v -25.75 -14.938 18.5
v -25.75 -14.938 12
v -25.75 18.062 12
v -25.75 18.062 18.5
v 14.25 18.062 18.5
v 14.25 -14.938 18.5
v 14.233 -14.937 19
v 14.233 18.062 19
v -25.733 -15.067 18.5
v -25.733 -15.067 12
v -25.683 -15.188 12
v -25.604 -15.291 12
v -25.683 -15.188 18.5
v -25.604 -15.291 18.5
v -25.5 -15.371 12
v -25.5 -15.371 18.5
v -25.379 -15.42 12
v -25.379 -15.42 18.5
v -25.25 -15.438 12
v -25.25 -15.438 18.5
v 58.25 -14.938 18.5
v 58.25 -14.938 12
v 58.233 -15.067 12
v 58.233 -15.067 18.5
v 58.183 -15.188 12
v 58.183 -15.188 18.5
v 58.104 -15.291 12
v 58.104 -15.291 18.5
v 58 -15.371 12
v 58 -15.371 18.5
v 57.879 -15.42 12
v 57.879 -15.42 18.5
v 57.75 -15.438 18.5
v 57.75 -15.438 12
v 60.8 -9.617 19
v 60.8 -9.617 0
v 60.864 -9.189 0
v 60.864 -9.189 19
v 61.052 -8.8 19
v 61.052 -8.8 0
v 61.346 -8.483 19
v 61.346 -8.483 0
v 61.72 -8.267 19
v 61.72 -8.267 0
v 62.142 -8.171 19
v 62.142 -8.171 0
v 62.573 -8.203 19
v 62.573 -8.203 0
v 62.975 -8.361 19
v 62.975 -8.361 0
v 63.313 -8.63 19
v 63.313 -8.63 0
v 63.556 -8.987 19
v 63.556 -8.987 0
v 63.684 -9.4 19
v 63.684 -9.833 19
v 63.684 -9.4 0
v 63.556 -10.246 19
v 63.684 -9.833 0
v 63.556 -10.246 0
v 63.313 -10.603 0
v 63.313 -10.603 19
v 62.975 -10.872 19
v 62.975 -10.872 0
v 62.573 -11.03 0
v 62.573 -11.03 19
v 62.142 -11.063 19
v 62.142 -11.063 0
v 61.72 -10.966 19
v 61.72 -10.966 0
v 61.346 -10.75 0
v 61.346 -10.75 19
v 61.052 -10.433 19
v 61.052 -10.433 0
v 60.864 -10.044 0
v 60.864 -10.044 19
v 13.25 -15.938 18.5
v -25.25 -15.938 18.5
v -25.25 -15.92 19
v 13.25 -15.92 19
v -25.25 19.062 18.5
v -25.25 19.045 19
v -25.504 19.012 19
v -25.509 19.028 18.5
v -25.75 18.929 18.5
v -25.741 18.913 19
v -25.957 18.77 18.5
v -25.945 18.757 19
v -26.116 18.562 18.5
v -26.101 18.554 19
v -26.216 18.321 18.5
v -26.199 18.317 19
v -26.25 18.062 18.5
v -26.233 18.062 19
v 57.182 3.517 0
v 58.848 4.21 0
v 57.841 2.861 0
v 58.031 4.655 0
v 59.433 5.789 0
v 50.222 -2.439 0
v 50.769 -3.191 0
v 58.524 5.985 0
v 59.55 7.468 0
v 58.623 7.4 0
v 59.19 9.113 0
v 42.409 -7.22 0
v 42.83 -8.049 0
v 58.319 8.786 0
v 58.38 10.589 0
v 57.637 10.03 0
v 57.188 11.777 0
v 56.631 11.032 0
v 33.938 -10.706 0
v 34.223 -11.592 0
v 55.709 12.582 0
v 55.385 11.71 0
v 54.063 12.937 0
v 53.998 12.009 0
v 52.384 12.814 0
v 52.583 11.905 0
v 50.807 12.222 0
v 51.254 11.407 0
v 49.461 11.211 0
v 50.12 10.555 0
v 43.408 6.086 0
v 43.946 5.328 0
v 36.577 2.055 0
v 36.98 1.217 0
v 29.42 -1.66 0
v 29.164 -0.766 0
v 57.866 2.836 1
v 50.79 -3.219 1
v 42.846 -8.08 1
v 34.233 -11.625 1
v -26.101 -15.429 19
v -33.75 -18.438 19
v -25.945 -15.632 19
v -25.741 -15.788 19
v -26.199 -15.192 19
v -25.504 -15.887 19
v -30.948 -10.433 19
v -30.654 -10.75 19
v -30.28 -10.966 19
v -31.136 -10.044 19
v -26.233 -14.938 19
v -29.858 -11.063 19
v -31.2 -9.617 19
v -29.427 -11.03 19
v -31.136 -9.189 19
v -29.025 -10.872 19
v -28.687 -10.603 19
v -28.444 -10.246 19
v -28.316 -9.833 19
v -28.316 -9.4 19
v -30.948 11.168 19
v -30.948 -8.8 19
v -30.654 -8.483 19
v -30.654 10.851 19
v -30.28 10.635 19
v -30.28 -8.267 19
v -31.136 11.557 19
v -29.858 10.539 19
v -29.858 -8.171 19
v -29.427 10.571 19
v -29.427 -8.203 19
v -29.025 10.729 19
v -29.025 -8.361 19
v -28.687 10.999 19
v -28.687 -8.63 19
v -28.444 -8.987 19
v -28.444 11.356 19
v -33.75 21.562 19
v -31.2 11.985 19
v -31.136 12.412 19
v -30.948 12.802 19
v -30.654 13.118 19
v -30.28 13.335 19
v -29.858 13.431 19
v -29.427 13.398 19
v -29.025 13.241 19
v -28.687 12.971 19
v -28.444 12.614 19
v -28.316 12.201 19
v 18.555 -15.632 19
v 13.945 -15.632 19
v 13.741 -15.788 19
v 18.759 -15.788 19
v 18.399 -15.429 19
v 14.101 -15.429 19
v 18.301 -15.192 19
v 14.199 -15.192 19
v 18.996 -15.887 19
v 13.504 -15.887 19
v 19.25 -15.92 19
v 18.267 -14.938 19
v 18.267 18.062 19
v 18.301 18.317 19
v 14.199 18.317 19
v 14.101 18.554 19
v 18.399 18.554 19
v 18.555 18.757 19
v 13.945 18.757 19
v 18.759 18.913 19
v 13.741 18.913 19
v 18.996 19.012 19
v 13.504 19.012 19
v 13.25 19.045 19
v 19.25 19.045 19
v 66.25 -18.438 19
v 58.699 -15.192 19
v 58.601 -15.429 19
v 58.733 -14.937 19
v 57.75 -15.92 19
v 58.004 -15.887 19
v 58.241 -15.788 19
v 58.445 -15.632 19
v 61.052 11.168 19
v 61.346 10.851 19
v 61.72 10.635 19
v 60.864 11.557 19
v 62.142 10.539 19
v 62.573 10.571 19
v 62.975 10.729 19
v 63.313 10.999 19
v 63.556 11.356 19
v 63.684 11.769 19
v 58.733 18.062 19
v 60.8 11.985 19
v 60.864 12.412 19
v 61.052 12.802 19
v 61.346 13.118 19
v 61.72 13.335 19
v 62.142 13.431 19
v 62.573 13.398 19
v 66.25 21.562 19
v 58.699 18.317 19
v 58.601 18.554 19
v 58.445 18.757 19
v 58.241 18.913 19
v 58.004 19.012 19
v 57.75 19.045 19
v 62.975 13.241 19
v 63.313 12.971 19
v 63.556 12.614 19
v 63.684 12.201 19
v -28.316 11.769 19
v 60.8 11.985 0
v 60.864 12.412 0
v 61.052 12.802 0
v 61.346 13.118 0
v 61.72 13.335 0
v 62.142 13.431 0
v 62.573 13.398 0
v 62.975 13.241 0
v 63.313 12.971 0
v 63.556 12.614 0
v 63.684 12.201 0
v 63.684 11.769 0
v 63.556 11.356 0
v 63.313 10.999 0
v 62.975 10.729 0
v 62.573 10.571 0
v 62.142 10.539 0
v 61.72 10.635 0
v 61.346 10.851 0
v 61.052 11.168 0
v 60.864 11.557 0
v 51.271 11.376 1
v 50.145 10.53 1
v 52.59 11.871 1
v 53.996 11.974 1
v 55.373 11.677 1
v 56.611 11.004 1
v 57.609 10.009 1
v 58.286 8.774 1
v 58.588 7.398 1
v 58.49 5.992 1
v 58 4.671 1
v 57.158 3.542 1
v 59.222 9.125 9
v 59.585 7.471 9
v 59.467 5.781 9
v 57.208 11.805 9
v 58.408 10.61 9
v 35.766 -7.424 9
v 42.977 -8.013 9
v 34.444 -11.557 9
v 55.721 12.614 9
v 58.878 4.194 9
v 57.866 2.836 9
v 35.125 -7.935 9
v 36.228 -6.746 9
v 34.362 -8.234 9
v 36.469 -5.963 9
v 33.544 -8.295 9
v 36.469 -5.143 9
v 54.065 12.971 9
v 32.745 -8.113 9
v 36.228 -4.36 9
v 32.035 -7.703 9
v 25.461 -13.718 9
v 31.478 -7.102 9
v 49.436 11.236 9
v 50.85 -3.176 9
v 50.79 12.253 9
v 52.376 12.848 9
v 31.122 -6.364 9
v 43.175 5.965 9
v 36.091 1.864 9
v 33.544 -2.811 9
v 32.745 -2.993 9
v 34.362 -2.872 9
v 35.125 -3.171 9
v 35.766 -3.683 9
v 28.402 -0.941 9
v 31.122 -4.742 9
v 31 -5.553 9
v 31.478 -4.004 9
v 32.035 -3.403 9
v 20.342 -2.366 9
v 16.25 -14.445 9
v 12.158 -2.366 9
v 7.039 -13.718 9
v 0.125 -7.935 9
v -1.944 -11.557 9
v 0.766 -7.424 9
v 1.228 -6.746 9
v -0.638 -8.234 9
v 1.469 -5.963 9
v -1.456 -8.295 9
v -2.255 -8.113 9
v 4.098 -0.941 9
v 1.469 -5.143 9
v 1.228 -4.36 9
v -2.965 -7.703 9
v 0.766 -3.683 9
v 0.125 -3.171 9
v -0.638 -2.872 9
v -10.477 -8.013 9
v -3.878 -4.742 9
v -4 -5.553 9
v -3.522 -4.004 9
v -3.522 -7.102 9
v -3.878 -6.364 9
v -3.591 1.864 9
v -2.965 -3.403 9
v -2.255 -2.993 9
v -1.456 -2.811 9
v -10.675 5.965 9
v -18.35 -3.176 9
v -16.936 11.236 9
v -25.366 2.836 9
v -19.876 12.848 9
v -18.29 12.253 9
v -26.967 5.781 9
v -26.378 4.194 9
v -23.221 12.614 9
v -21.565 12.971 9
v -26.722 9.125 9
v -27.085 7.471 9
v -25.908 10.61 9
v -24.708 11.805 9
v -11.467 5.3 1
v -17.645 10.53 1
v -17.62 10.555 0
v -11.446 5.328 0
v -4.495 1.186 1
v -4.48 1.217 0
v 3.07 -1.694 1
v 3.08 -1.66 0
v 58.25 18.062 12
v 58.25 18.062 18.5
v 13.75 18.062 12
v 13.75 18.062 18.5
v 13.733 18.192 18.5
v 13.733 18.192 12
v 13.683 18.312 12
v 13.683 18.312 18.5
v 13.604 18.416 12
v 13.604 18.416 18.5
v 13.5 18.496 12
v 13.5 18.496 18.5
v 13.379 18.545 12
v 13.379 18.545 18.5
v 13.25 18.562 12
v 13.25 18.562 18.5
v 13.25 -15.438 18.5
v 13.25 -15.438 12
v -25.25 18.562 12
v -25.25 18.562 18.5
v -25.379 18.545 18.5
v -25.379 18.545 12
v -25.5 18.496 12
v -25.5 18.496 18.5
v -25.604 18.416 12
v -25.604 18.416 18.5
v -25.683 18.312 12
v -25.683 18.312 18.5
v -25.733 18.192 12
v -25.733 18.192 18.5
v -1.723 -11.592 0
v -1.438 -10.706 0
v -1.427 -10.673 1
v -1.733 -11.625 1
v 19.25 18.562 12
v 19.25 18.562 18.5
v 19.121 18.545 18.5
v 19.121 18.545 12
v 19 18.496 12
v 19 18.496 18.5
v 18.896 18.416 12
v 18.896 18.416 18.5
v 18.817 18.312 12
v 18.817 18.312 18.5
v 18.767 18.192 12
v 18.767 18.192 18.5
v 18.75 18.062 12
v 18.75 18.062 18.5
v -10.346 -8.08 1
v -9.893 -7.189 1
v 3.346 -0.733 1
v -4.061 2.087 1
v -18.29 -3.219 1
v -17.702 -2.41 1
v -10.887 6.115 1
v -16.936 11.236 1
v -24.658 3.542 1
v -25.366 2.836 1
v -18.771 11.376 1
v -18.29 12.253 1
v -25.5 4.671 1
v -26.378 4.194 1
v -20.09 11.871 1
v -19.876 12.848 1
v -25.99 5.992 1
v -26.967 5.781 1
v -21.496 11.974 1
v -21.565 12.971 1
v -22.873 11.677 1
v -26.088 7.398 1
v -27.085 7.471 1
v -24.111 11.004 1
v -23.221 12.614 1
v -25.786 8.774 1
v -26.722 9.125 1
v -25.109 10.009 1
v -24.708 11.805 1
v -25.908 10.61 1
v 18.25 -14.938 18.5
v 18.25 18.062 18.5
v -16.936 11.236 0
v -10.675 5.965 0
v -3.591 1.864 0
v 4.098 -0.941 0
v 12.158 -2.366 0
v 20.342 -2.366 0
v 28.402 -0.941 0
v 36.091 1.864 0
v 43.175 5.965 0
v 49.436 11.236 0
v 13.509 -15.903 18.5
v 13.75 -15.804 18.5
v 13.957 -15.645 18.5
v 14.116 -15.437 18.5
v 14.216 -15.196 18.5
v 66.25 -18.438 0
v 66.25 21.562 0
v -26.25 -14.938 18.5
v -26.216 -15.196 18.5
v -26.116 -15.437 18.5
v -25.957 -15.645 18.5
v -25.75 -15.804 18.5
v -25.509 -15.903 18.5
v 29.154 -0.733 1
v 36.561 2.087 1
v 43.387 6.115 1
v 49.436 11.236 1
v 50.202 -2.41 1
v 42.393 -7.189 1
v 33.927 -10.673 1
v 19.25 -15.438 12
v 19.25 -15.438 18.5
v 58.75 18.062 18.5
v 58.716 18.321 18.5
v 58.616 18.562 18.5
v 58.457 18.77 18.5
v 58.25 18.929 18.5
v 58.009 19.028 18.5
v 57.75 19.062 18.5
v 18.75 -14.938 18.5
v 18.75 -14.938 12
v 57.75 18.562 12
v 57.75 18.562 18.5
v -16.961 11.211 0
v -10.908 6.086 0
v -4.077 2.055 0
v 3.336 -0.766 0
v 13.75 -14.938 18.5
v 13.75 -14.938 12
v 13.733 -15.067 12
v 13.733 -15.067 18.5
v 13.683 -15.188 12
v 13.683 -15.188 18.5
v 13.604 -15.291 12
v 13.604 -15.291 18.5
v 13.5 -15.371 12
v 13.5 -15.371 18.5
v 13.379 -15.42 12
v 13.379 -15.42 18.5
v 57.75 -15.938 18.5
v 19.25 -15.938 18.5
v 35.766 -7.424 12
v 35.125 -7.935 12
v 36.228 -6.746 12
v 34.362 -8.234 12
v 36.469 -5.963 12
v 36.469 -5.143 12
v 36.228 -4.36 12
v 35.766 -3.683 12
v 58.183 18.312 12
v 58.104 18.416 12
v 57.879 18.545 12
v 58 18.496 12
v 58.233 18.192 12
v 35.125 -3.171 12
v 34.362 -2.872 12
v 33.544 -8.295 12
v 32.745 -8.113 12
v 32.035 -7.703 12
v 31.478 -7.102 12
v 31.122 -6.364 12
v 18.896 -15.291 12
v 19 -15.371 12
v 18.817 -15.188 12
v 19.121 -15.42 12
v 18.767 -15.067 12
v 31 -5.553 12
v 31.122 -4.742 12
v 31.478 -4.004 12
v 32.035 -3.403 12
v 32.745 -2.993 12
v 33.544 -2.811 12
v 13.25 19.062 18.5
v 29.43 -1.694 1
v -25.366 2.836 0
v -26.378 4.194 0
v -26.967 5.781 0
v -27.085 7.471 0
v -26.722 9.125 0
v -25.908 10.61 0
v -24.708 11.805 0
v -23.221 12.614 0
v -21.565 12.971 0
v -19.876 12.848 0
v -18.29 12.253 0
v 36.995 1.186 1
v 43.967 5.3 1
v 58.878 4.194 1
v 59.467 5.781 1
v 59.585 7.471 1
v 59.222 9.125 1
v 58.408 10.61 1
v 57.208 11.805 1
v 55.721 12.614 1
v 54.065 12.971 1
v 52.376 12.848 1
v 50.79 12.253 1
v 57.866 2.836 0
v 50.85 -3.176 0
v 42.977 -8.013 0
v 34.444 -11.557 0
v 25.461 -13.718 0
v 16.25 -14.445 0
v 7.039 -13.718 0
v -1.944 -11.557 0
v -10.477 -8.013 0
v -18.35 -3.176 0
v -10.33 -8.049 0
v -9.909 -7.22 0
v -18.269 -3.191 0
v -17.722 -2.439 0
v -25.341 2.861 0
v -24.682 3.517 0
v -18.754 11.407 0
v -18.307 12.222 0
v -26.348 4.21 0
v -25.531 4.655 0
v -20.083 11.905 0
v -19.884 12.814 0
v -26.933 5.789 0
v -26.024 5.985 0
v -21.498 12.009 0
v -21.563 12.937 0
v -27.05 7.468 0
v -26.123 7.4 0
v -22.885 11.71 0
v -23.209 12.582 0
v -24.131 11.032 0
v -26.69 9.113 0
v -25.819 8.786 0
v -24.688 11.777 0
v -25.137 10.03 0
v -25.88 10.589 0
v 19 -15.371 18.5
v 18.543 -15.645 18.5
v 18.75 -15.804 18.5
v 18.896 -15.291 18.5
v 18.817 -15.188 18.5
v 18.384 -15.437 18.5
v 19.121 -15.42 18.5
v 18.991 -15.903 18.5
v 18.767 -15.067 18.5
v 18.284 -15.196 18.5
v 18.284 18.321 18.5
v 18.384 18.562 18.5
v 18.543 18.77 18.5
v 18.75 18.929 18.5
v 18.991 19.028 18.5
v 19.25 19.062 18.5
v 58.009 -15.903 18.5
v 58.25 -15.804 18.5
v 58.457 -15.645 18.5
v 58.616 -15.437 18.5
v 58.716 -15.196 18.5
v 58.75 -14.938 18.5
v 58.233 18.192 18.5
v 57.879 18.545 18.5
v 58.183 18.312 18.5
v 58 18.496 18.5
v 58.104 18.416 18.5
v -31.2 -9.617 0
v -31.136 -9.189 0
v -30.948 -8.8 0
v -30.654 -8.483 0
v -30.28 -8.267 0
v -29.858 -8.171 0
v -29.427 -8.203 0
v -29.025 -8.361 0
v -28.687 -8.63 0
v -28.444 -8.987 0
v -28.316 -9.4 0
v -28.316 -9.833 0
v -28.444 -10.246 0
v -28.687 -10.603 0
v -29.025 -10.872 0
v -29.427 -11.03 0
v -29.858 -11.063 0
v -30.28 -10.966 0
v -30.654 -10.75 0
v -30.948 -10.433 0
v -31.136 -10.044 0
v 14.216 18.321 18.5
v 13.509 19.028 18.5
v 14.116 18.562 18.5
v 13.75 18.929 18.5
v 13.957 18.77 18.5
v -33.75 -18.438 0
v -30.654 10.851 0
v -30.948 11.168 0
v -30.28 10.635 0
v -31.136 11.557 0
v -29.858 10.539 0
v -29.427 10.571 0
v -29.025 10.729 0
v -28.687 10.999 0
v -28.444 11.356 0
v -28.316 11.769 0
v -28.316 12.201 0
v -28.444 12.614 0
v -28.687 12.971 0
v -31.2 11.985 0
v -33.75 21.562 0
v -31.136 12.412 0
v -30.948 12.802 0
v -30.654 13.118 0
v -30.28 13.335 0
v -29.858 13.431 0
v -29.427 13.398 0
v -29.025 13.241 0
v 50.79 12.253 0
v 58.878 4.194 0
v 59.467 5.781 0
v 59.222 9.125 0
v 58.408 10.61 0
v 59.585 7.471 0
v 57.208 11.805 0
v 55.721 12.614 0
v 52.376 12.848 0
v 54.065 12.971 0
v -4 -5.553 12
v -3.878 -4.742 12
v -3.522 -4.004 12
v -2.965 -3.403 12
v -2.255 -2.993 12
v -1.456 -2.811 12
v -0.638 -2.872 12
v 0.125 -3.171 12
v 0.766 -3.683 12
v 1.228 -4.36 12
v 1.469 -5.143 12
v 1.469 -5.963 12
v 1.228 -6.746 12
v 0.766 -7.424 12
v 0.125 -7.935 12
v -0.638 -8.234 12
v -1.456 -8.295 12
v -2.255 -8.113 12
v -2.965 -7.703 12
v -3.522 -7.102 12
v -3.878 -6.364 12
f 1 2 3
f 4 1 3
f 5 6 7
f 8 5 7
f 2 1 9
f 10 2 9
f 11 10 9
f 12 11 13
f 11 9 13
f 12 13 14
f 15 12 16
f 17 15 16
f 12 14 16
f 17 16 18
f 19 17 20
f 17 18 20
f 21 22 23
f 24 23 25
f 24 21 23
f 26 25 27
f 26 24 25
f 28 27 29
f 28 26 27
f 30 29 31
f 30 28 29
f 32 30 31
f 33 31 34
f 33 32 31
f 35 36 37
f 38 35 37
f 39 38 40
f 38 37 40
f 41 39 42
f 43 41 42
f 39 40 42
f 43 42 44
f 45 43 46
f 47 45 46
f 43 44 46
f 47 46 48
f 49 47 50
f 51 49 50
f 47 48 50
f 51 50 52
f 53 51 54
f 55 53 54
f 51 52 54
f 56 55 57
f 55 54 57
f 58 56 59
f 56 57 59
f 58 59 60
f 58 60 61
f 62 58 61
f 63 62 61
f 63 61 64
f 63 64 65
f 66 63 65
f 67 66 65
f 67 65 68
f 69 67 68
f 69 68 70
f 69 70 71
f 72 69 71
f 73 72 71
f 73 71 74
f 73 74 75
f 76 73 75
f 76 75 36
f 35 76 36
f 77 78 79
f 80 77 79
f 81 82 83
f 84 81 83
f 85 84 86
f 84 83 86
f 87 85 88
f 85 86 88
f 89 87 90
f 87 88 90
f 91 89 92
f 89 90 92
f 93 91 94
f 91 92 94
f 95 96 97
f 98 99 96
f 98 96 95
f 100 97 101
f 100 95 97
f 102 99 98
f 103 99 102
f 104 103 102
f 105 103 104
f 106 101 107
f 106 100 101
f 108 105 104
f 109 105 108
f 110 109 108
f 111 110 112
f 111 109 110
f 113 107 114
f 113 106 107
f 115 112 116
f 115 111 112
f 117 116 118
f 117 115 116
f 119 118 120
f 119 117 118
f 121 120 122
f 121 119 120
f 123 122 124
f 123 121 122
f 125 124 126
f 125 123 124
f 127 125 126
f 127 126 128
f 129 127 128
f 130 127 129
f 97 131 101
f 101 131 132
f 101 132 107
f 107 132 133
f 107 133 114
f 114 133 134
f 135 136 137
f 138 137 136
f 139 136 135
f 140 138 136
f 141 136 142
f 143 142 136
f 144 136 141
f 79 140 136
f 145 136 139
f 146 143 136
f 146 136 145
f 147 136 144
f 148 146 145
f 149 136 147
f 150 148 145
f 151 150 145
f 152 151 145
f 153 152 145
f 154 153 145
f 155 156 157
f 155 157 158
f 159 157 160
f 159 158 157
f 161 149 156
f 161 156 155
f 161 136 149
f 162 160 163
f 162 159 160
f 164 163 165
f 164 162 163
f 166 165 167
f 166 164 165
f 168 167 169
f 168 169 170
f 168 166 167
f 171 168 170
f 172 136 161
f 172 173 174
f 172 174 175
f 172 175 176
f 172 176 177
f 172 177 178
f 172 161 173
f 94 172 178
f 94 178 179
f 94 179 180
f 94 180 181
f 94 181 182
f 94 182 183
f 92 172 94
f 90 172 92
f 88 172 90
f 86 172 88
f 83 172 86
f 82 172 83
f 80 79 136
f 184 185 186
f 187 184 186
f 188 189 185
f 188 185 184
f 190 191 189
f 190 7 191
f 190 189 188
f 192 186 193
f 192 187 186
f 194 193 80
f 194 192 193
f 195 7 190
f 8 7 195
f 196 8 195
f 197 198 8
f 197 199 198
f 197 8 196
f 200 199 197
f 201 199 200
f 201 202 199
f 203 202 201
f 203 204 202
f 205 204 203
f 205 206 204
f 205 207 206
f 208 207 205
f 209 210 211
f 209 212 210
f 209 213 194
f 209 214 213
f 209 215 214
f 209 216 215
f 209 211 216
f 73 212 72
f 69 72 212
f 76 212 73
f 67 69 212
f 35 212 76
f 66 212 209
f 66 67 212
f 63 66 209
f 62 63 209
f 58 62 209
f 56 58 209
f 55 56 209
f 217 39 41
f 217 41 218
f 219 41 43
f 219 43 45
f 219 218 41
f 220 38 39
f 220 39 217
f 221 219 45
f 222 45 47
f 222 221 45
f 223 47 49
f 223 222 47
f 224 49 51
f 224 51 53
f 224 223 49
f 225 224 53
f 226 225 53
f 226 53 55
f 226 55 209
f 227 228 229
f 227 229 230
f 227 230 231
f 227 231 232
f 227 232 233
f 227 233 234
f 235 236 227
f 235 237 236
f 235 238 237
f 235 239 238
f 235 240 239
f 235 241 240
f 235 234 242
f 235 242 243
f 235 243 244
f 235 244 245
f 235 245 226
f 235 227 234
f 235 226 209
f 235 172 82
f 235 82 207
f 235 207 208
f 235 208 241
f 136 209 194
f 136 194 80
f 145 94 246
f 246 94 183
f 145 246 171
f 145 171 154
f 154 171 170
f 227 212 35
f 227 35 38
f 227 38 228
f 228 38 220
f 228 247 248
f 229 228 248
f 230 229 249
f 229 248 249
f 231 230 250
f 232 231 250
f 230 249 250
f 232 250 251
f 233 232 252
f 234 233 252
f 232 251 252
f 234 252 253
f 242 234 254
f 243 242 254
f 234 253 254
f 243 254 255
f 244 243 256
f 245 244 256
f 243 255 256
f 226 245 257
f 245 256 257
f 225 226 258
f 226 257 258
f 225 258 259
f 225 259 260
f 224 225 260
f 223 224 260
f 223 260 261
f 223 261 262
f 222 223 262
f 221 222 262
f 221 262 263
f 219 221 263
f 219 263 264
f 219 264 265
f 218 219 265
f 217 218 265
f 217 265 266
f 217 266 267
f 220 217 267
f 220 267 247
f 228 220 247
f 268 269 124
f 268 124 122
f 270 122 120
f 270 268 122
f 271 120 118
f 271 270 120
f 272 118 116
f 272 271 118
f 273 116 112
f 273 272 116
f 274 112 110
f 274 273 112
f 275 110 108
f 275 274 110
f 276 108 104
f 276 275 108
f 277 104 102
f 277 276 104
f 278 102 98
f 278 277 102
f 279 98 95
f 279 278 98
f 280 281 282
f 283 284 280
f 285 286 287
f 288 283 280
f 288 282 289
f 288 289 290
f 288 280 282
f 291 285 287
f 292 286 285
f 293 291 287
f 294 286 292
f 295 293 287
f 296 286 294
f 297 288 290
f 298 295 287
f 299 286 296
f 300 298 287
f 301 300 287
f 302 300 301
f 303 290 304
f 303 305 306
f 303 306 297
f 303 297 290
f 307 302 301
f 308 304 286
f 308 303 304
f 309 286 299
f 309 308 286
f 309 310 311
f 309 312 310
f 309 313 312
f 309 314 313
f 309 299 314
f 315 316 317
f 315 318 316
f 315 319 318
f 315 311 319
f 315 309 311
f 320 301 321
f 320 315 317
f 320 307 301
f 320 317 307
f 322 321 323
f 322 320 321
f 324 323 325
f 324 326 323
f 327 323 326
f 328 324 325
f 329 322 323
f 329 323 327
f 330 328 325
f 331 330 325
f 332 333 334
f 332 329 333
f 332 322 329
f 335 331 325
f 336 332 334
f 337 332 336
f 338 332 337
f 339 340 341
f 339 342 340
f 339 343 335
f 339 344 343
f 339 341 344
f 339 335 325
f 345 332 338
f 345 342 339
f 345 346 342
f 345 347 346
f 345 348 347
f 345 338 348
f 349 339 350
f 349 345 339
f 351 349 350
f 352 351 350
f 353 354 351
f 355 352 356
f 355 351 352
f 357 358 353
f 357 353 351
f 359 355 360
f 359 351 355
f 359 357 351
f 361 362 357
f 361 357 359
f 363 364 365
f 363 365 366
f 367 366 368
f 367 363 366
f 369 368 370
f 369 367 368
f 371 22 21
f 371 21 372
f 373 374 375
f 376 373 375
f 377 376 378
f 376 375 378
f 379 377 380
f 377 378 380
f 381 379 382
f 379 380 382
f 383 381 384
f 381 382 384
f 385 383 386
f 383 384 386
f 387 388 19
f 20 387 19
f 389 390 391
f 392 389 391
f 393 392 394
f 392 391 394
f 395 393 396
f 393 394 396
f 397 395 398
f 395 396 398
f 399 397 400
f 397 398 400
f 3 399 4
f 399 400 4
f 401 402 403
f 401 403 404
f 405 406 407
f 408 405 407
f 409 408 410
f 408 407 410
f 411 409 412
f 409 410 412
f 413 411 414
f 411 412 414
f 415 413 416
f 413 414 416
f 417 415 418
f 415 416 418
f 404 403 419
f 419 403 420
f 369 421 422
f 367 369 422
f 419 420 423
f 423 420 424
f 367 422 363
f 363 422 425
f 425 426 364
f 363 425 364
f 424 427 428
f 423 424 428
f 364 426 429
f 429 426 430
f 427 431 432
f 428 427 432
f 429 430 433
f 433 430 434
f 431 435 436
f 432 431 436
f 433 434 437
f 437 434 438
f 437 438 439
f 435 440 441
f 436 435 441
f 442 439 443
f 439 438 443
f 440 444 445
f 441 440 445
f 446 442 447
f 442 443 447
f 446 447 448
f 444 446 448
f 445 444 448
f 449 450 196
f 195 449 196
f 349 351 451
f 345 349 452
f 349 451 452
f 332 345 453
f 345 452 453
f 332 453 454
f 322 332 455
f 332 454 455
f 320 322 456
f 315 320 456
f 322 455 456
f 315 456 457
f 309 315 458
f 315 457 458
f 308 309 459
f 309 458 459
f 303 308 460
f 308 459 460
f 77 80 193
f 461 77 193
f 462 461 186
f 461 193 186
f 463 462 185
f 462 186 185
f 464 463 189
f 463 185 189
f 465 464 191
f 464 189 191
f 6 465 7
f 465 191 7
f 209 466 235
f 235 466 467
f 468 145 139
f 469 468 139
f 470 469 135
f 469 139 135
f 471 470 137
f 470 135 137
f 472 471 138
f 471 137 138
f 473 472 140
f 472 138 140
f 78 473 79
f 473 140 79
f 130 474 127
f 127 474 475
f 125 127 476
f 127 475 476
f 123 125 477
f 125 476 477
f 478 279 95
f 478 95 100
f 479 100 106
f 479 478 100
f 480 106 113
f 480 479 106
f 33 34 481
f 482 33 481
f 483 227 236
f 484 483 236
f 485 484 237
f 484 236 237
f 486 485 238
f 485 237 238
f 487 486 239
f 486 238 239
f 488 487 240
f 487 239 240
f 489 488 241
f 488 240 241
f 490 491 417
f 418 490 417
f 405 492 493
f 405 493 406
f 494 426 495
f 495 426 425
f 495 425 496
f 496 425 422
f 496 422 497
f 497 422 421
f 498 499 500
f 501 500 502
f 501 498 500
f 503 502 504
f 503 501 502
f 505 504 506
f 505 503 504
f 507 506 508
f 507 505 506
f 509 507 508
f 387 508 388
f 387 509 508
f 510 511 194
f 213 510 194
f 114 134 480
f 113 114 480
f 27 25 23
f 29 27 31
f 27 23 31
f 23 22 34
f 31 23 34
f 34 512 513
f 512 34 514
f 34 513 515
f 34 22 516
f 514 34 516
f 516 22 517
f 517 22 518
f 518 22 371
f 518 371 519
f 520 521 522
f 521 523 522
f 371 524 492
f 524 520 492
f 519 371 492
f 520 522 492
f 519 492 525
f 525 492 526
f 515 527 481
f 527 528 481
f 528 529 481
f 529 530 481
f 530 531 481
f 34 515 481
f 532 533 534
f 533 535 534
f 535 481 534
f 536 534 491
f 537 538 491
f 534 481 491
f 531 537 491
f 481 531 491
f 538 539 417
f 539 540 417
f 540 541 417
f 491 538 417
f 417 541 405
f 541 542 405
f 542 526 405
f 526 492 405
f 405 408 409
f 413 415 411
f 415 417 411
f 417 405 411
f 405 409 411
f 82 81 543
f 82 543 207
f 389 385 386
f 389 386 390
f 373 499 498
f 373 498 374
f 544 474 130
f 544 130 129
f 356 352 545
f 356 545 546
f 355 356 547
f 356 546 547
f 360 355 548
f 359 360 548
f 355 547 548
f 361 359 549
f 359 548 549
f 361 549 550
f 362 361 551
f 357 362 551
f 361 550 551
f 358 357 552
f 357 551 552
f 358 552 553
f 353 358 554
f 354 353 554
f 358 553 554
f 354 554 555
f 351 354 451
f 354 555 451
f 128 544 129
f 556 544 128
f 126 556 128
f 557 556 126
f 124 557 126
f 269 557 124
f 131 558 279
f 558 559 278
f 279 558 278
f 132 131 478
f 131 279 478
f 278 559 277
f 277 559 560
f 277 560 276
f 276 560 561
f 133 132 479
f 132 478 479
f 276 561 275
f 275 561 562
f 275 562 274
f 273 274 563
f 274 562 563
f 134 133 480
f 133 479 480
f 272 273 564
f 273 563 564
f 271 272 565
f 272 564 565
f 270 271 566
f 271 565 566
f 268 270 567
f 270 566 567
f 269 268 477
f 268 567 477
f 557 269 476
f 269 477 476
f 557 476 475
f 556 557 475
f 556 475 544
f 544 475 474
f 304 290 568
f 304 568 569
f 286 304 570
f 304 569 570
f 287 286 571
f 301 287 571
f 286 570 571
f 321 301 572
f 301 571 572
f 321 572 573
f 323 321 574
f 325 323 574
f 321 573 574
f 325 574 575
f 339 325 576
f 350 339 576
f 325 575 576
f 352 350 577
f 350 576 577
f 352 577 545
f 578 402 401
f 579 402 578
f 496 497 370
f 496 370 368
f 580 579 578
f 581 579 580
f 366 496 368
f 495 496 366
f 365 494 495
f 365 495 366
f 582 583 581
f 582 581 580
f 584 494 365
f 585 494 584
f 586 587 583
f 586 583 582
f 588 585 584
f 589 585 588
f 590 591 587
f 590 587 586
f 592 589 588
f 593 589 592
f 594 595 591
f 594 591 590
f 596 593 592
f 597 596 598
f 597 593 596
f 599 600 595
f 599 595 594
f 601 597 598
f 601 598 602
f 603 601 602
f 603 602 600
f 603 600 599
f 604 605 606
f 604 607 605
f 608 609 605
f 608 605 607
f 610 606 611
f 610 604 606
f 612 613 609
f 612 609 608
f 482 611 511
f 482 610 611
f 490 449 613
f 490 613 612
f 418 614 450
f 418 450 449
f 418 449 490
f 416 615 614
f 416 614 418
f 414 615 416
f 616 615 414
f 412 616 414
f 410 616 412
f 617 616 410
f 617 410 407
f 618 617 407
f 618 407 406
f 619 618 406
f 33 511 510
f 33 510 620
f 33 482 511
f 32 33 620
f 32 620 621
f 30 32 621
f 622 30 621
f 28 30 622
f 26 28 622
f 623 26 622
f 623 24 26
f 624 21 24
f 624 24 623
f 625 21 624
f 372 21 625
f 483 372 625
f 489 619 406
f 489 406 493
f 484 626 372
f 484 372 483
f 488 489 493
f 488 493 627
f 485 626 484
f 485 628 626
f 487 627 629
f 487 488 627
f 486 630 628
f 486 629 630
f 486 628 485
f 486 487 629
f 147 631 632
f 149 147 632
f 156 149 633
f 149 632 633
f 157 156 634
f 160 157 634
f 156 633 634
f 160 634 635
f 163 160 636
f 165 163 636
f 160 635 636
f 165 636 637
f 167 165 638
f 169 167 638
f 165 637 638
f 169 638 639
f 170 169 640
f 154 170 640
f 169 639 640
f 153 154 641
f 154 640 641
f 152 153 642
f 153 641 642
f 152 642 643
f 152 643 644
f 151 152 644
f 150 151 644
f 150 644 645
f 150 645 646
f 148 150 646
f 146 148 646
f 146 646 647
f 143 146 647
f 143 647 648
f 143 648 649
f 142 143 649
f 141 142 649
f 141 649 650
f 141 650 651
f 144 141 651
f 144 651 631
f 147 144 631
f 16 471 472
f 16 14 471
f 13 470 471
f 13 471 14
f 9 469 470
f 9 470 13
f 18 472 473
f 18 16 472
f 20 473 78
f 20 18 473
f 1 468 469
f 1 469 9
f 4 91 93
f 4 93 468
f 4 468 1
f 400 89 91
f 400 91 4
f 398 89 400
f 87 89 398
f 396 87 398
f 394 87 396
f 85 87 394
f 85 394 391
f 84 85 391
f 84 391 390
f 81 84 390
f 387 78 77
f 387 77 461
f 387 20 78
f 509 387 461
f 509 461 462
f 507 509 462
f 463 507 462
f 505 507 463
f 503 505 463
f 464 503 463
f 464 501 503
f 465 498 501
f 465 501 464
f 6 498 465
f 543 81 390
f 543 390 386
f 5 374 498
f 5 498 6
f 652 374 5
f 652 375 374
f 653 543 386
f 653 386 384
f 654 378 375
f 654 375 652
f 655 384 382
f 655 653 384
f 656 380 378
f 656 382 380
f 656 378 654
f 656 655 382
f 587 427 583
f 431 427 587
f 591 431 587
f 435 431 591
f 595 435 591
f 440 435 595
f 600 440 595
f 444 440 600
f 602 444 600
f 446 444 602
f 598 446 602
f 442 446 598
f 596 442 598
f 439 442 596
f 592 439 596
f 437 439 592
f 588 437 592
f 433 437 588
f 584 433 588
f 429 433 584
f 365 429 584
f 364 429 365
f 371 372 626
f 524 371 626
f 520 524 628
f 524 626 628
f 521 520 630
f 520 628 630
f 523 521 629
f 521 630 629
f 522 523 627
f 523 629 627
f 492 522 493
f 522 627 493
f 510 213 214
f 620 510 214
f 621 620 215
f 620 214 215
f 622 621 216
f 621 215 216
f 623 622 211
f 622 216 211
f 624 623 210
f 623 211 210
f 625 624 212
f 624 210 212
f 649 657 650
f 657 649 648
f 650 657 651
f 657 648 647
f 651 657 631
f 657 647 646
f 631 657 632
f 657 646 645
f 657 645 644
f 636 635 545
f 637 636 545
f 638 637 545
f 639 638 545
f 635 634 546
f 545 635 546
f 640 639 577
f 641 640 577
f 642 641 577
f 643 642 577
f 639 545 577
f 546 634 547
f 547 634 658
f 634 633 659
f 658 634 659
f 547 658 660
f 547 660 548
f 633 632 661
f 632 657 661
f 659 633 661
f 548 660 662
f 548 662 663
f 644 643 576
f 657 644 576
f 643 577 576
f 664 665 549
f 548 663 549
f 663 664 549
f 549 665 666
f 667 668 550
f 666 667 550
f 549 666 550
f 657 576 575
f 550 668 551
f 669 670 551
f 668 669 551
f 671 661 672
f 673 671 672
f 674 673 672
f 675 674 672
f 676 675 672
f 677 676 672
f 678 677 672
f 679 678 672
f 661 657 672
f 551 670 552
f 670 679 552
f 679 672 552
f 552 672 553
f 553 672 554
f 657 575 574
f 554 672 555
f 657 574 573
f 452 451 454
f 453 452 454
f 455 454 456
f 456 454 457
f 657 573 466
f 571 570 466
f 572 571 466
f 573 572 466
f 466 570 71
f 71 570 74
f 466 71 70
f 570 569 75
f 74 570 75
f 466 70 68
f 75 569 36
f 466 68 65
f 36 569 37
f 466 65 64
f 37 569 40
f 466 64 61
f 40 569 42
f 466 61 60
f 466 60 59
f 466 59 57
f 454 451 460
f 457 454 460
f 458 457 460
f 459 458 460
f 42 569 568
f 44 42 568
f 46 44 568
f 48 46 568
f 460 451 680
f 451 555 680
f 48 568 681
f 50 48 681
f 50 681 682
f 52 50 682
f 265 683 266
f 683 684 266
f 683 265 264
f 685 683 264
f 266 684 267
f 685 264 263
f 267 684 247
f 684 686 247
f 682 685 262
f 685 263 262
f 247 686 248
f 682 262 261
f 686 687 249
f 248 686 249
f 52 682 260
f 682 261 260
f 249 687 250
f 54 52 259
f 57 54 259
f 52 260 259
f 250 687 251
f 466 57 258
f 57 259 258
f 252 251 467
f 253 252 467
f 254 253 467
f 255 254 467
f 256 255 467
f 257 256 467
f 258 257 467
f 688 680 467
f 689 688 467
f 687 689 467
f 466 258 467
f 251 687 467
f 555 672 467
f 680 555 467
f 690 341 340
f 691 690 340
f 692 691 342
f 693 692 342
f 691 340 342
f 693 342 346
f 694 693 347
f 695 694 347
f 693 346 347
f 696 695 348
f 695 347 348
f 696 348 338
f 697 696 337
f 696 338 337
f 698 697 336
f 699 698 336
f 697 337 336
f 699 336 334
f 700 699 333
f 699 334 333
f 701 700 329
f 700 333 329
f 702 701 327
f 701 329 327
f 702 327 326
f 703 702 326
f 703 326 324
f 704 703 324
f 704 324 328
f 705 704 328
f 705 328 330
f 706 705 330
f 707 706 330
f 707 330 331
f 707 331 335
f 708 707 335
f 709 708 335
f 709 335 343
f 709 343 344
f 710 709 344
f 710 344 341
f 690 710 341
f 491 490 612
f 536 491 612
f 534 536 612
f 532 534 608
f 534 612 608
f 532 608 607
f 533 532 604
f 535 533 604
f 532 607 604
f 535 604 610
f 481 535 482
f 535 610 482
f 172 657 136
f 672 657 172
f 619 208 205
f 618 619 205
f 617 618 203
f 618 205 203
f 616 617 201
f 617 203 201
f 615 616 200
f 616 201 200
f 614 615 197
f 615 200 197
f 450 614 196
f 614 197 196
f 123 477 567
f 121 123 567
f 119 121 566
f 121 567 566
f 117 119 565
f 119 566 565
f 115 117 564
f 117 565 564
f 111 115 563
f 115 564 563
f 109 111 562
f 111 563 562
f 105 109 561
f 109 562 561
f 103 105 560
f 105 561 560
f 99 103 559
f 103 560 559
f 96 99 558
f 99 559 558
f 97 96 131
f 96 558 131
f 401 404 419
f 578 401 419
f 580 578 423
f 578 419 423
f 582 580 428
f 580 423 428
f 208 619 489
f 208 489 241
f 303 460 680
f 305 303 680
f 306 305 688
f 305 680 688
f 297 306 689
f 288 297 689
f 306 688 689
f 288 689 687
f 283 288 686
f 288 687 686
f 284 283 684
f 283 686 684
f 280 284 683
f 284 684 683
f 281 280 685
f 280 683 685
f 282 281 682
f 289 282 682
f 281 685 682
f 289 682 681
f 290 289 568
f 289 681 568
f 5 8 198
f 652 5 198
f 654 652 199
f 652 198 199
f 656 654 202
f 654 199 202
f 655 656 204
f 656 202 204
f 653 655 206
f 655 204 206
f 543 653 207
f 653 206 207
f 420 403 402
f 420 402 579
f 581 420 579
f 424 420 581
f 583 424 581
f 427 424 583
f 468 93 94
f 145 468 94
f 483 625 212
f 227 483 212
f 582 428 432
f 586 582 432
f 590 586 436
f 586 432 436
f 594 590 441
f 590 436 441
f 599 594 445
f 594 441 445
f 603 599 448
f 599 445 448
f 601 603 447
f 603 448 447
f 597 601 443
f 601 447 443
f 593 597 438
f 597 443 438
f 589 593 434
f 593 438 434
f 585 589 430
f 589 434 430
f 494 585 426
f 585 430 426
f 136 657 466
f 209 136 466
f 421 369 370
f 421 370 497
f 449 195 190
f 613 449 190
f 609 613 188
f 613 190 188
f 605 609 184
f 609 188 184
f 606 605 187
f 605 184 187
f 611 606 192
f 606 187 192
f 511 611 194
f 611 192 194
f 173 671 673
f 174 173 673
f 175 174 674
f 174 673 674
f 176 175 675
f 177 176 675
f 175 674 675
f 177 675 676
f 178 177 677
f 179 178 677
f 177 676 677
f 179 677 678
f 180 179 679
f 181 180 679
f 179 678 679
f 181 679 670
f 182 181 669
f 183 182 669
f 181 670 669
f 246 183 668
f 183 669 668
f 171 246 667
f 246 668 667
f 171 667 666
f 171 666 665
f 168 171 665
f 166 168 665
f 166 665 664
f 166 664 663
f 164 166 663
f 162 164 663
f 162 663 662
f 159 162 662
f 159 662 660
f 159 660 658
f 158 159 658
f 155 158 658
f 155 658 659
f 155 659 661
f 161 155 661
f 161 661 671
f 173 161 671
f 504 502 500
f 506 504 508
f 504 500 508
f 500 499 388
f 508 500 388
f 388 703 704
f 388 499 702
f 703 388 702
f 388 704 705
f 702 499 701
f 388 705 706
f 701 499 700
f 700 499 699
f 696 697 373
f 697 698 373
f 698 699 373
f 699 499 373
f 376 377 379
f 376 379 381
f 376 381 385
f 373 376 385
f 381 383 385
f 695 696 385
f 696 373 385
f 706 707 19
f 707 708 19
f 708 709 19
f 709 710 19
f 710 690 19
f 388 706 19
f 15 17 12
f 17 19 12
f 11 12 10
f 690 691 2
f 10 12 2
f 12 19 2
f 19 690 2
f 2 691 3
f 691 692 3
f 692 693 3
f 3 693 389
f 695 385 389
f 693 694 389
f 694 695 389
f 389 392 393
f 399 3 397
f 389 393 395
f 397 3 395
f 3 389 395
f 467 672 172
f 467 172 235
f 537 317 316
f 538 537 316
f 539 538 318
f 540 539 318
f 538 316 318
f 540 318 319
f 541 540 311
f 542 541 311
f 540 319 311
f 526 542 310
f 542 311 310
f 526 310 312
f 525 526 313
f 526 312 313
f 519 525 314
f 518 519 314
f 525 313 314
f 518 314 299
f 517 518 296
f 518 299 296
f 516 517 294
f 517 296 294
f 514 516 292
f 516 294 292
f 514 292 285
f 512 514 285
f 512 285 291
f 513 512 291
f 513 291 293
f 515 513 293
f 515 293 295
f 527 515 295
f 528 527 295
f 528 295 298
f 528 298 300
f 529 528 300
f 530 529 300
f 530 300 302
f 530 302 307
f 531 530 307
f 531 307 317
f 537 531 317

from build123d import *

# Parameters (mm, degrees)
SKETCH1_W           = 100
SKETCH1_H           = 40
BOSS_EXTRUDE1_DEPTH = 38
CUT_EXTRUDE2_START  = -12
SKETCH2_W           = 39.5
SKETCH2_H           = 34
CUT_EXTRUDE2_DEPTH  = 21
CUT_EXTRUDE4_REACH  = 81.36
SKETCH4_R           = 1.45
SKETCH6_W           = 100
SKETCH6_H           = 19
CUT_EXTRUDE5_DEPTH  = 87.215210375
FILLET1_R           = 0.5
CUT_EXTRUDE6_START  = 6.5
CUT_EXTRUDE6_DEPTH  = 0.5
CUT_EXTRUDE6_TAPER  = 2
CUT_EXTRUDE7_START  = 6.5
CUT_EXTRUDE7_DEPTH  = 0.5
CUT_EXTRUDE7_TAPER  = 2
CUT_EXTRUDE8_DEPTH  = 9
CUT_EXTRUDE9_REACH  = 72.385
SKETCH14_R          = 2.75
BOSS_EXTRUDE2_START = 8
BOSS_EXTRUDE2_DEPTH = 1
BOSS_EXTRUDE2_DRAFT = 2
CUT_EXTRUDE11_START = 9
CUT_EXTRUDE11_DEPTH = 1


with BuildPart() as part:
    # Sketch1 → Boss-Extrude1 (new body)
    with BuildSketch(Plane.XY):
        with Locations((16.25, 1.5625)):
            Rectangle(SKETCH1_W, SKETCH1_H)
    extrude(amount=BOSS_EXTRUDE1_DEPTH)

    # Sketch2 → Cut-Extrude2 (cut)
    with BuildSketch(Plane(origin=(0, 0, 0), x_dir=(-1, 0, 0), z_dir=(0, 0, -1)).offset(CUT_EXTRUDE2_START)):
        with Locations((-38.5, 1.5625)):
            Rectangle(SKETCH2_W, SKETCH2_H)
        with Locations((6, 1.5625)):
            Rectangle(SKETCH2_W, SKETCH2_H)
    extrude(amount=-CUT_EXTRUDE2_DEPTH, mode=Mode.SUBTRACT)

    # Sketch4 → Cut-Extrude4 (cut, up to next)
    with BuildSketch(Plane(origin=(0, 0, 0), x_dir=(-1, 0, 0), z_dir=(0, 0, -1)), mode=Mode.PRIVATE) as cut_extrude4_sk1:
        with Locations((-62.25, 11.98479819)):
            Circle(SKETCH4_R)
    cut_extrude4_tool1 = extrude(cut_extrude4_sk1.sketch, amount=-CUT_EXTRUDE4_REACH, mode=Mode.PRIVATE) & part.part
    # Sketch4 → Cut-Extrude4 (cut, up to next)
    with BuildSketch(Plane(origin=(0, 0, 0), x_dir=(-1, 0, 0), z_dir=(0, 0, -1)), mode=Mode.PRIVATE) as cut_extrude4_sk2:
        with Locations((-62.25, -9.616561755)):
            Circle(SKETCH4_R)
    cut_extrude4_tool2 = extrude(cut_extrude4_sk2.sketch, amount=-CUT_EXTRUDE4_REACH, mode=Mode.PRIVATE) & part.part
    # Sketch4 → Cut-Extrude4 (cut, up to next)
    with BuildSketch(Plane(origin=(0, 0, 0), x_dir=(-1, 0, 0), z_dir=(0, 0, -1)), mode=Mode.PRIVATE) as cut_extrude4_sk3:
        with Locations((29.75, 11.98479819)):
            Circle(SKETCH4_R)
    cut_extrude4_tool3 = extrude(cut_extrude4_sk3.sketch, amount=-CUT_EXTRUDE4_REACH, mode=Mode.PRIVATE) & part.part
    # Sketch4 → Cut-Extrude4 (cut, up to next)
    with BuildSketch(Plane(origin=(0, 0, 0), x_dir=(-1, 0, 0), z_dir=(0, 0, -1)), mode=Mode.PRIVATE) as cut_extrude4_sk4:
        with Locations((29.75, -9.616561755)):
            Circle(SKETCH4_R)
    cut_extrude4_tool4 = extrude(cut_extrude4_sk4.sketch, amount=-CUT_EXTRUDE4_REACH, mode=Mode.PRIVATE) & part.part
    add(cut_extrude4_tool1.solids().sort_by_distance((62.25, 11.984798, 0))[0], mode=Mode.SUBTRACT)
    add(cut_extrude4_tool2.solids().sort_by_distance((62.25, -9.616562, 0))[0], mode=Mode.SUBTRACT)
    add(cut_extrude4_tool3.solids().sort_by_distance((-29.75, 11.984798, 0))[0], mode=Mode.SUBTRACT)
    add(cut_extrude4_tool4.solids().sort_by_distance((-29.75, -9.616562, 0))[0], mode=Mode.SUBTRACT)

    # Sketch6 → Cut-Extrude5 (cut, through all)
    with BuildSketch(Plane(origin=(0, 21.5625, 0), x_dir=(1, 0, 0), z_dir=(0, 1, 0))):
        with Locations((16.25, -28.5)):
            Rectangle(SKETCH6_W, SKETCH6_H)
    extrude(amount=-CUT_EXTRUDE5_DEPTH, mode=Mode.SUBTRACT)

    # Fillet1
    fillet1_edges = [part.edges().sort_by_distance(p)[0] for p in [
        (-25.75, -15.4375, 15.5),
        (13.75, -15.4375, 15.5),
        (-25.75, 18.5625, 15.5),
        (13.75, 18.5625, 15.5),
        (18.75, -15.4375, 15.5),
        (58.25, -15.4375, 15.5),
        (18.75, 18.5625, 15.5),
        (58.25, 18.5625, 15.5),
    ]]
    fillet(fillet1_edges, radius=FILLET1_R)

    # Sketch10 → Cut-Extrude6 (cut)
    with BuildSketch(Plane.XY.offset(12).offset(CUT_EXTRUDE6_START)):
        with BuildLine():
            Line((14.25, -14.9375), (14.25, 18.0625))
            ThreePointArc((14.25, 18.0625), (13.957106781, 18.769606781), (13.25, 19.0625))
            Line((13.25, 19.0625), (-25.25, 19.0625))
            ThreePointArc((-25.25, 19.0625), (-25.957106781, 18.769606781), (-26.25, 18.0625))
            Line((-26.25, 18.0625), (-26.25, -14.9375))
            ThreePointArc((-26.25, -14.9375), (-25.957106781, -15.644606781), (-25.25, -15.9375))
            Line((-25.25, -15.9375), (13.25, -15.9375))
            ThreePointArc((13.25, -15.9375), (13.957106781, -15.644606781), (14.25, -14.9375))
        make_face()
    extrude(amount=CUT_EXTRUDE6_DEPTH, taper=CUT_EXTRUDE6_TAPER, mode=Mode.SUBTRACT)

    # Sketch11 → Cut-Extrude7 (cut)
    with BuildSketch(Plane.XY.offset(12).offset(CUT_EXTRUDE7_START)):
        with BuildLine():
            Line((58.75, -14.9375), (58.75, 18.0625))
            ThreePointArc((58.75, 18.0625), (58.457106781, 18.769606781), (57.75, 19.0625))
            Line((57.75, 19.0625), (19.25, 19.0625))
            ThreePointArc((19.25, 19.0625), (18.542893219, 18.769606781), (18.25, 18.0625))
            Line((18.25, 18.0625), (18.25, -14.9375))
            ThreePointArc((18.25, -14.9375), (18.542893219, -15.644606781), (19.25, -15.9375))
            Line((19.25, -15.9375), (57.75, -15.9375))
            ThreePointArc((57.75, -15.9375), (58.457106781, -15.644606781), (58.75, -14.9375))
        make_face()
    extrude(amount=CUT_EXTRUDE7_DEPTH, taper=CUT_EXTRUDE7_TAPER, mode=Mode.SUBTRACT)

    # Sketch12 → Cut-Extrude8 (cut)
    with BuildSketch(Plane(origin=(0, 0, 0), x_dir=(-1, 0, 0), z_dir=(0, 0, -1))):
        with BuildLine():
            ThreePointArc((-57.865926724, 2.836052), (-16.25, -14.444957865), (25.365926724, 2.836052))
            ThreePointArc((25.365926724, 2.836052), (25.351045487, 11.250609537), (16.93648795, 11.235728299))
            ThreePointArc((16.93648795, 11.235728299), (-16.25, -2.544957865), (-49.43648795, 11.235728299))
            ThreePointArc((-49.43648795, 11.235728299), (-57.851045487, 11.250609537), (-57.865926724, 2.836052))
        make_face()
    extrude(amount=-CUT_EXTRUDE8_DEPTH, mode=Mode.SUBTRACT)

    # Sketch14 → Cut-Extrude9 (cut, up to next)
    with BuildSketch(Plane(origin=(0, 0, 9), x_dir=(-1, 0, 0), z_dir=(0, 0, -1)), mode=Mode.PRIVATE) as cut_extrude9_sk1:
        with Locations((-33.75, -5.553059818)):
            Circle(SKETCH14_R)
    cut_extrude9_tool1 = extrude(cut_extrude9_sk1.sketch, amount=-CUT_EXTRUDE9_REACH, mode=Mode.PRIVATE) & part.part
    # Sketch14 → Cut-Extrude9 (cut, up to next)
    with BuildSketch(Plane(origin=(0, 0, 9), x_dir=(-1, 0, 0), z_dir=(0, 0, -1)), mode=Mode.PRIVATE) as cut_extrude9_sk2:
        with Locations((1.25, -5.553059818)):
            Circle(SKETCH14_R)
    cut_extrude9_tool2 = extrude(cut_extrude9_sk2.sketch, amount=-CUT_EXTRUDE9_REACH, mode=Mode.PRIVATE) & part.part
    add(cut_extrude9_tool1.solids().sort_by_distance((33.75, -5.55306, 9))[0], mode=Mode.SUBTRACT)
    add(cut_extrude9_tool2.solids().sort_by_distance((-1.25, -5.55306, 9))[0], mode=Mode.SUBTRACT)


with BuildPart() as body_2:
    # Sketch15 → Boss-Extrude2 (with draft: the straight prism first)
    with BuildSketch(Plane(origin=(0, 0, 9), x_dir=(-1, 0, 0), z_dir=(0, 0, -1)).offset(BOSS_EXTRUDE2_START)):
        with BuildLine():
            ThreePointArc((-49.43648795, 11.235728299), (-57.851045487, 11.250609537), (-57.865926724, 2.836052))
            ThreePointArc((-57.865926724, 2.836052), (-16.25, -14.444957865), (25.365926724, 2.836052))
            ThreePointArc((25.365926724, 2.836052), (25.351045487, 11.250609537), (16.93648795, 11.235728299))
            ThreePointArc((16.93648795, 11.235728299), (-16.25, -2.544957865), (-49.43648795, 11.235728299))
        make_face()
        with BuildLine():
            ThreePointArc((-50.144844149, 10.529873148), (-57.145190336, 10.542253337), (-57.157570525, 3.541907151))
            ThreePointArc((-57.157570525, 3.541907151), (-16.25, -13.444957865), (24.657570525, 3.541907151))
            ThreePointArc((24.657570525, 3.541907151), (24.645190336, 10.542253337), (17.644844149, 10.529873148))
            ThreePointArc((17.644844149, 10.529873148), (-16.25, -3.544957865), (-50.144844149, 10.529873148))
        make_face(mode=Mode.SUBTRACT)
    extrude(amount=BOSS_EXTRUDE2_DEPTH)
    # Boss-Extrude2: the draft: its side faces are tilted about the plane it starts from
    boss_extrude2_sides = [body_2.faces().sort_by_distance(p)[0] for p in [
        (-25.351045487, 11.250609537, 0.5),
        (16.25, -2.544957865, 0.5),
        (57.851045487, 11.250609537, 0.5),
        (16.25, -14.444957865, 0.5),
        (16.25, -13.444957865, 0.5),
        (57.145190336, 10.542253337, 0.5),
        (16.25, -3.544957865, 0.5),
        (-24.645190336, 10.542253337, 0.5),
    ]]
    draft(boss_extrude2_sides, Plane(origin=(0, 0, 9), x_dir=(-1, 0, 0), z_dir=(0, 0, -1)).offset(BOSS_EXTRUDE2_START), BOSS_EXTRUDE2_DRAFT)

    # Sketch16 → Cut-Extrude11 (cut)
    with BuildSketch(Plane(origin=(0, 0, 9), x_dir=(-1, 0, 0), z_dir=(0, 0, -1)).offset(CUT_EXTRUDE11_START)):
        with BuildLine():
            Line((-29.154329219, -0.73272854), (-29.429768477, -1.694047018))
            ThreePointArc((-29.429768477, -1.694047018), (-16.25, -3.544957865), (-3.070231523, -1.694047018))
            Line((-3.070231523, -1.694047018), (-3.345670781, -0.73272854))
            ThreePointArc((-3.345670781, -0.73272854), (-16.25, -2.544957865), (-29.154329219, -0.73272854))
        make_face()
        with BuildLine():
            Line((1.427332066, -10.672902816), (1.733433054, -11.624901863))
            ThreePointArc((1.733433054, -11.624901863), (-16.25, -14.444957865), (-34.233433054, -11.624901863))
            Line((-34.233433054, -11.624901863), (-33.927332066, -10.672902816))
            ThreePointArc((-33.927332066, -10.672902816), (-16.25, -13.444957865), (1.427332066, -10.672902816))
        make_face()
    extrude(amount=-CUT_EXTRUDE11_DEPTH, mode=Mode.SUBTRACT)


with BuildPart() as cut_extrude11_piece_1:
    # of the separate pieces the step leaves, piece 1, a body of its own (cut_extrude11_pieces)
    add(body_2.part.solids().sort_by_distance((57.865926724, 2.836052, 1))[0])


with BuildPart() as cut_extrude11_piece_2:
    # of the separate pieces the step leaves, piece 2, a body of its own (cut_extrude11_pieces)
    add(body_2.part.solids().sort_by_distance((-25.365926724, 2.836052, 1))[0])


solid = Compound([part.part, cut_extrude11_piece_1.part, cut_extrude11_piece_2.part])
